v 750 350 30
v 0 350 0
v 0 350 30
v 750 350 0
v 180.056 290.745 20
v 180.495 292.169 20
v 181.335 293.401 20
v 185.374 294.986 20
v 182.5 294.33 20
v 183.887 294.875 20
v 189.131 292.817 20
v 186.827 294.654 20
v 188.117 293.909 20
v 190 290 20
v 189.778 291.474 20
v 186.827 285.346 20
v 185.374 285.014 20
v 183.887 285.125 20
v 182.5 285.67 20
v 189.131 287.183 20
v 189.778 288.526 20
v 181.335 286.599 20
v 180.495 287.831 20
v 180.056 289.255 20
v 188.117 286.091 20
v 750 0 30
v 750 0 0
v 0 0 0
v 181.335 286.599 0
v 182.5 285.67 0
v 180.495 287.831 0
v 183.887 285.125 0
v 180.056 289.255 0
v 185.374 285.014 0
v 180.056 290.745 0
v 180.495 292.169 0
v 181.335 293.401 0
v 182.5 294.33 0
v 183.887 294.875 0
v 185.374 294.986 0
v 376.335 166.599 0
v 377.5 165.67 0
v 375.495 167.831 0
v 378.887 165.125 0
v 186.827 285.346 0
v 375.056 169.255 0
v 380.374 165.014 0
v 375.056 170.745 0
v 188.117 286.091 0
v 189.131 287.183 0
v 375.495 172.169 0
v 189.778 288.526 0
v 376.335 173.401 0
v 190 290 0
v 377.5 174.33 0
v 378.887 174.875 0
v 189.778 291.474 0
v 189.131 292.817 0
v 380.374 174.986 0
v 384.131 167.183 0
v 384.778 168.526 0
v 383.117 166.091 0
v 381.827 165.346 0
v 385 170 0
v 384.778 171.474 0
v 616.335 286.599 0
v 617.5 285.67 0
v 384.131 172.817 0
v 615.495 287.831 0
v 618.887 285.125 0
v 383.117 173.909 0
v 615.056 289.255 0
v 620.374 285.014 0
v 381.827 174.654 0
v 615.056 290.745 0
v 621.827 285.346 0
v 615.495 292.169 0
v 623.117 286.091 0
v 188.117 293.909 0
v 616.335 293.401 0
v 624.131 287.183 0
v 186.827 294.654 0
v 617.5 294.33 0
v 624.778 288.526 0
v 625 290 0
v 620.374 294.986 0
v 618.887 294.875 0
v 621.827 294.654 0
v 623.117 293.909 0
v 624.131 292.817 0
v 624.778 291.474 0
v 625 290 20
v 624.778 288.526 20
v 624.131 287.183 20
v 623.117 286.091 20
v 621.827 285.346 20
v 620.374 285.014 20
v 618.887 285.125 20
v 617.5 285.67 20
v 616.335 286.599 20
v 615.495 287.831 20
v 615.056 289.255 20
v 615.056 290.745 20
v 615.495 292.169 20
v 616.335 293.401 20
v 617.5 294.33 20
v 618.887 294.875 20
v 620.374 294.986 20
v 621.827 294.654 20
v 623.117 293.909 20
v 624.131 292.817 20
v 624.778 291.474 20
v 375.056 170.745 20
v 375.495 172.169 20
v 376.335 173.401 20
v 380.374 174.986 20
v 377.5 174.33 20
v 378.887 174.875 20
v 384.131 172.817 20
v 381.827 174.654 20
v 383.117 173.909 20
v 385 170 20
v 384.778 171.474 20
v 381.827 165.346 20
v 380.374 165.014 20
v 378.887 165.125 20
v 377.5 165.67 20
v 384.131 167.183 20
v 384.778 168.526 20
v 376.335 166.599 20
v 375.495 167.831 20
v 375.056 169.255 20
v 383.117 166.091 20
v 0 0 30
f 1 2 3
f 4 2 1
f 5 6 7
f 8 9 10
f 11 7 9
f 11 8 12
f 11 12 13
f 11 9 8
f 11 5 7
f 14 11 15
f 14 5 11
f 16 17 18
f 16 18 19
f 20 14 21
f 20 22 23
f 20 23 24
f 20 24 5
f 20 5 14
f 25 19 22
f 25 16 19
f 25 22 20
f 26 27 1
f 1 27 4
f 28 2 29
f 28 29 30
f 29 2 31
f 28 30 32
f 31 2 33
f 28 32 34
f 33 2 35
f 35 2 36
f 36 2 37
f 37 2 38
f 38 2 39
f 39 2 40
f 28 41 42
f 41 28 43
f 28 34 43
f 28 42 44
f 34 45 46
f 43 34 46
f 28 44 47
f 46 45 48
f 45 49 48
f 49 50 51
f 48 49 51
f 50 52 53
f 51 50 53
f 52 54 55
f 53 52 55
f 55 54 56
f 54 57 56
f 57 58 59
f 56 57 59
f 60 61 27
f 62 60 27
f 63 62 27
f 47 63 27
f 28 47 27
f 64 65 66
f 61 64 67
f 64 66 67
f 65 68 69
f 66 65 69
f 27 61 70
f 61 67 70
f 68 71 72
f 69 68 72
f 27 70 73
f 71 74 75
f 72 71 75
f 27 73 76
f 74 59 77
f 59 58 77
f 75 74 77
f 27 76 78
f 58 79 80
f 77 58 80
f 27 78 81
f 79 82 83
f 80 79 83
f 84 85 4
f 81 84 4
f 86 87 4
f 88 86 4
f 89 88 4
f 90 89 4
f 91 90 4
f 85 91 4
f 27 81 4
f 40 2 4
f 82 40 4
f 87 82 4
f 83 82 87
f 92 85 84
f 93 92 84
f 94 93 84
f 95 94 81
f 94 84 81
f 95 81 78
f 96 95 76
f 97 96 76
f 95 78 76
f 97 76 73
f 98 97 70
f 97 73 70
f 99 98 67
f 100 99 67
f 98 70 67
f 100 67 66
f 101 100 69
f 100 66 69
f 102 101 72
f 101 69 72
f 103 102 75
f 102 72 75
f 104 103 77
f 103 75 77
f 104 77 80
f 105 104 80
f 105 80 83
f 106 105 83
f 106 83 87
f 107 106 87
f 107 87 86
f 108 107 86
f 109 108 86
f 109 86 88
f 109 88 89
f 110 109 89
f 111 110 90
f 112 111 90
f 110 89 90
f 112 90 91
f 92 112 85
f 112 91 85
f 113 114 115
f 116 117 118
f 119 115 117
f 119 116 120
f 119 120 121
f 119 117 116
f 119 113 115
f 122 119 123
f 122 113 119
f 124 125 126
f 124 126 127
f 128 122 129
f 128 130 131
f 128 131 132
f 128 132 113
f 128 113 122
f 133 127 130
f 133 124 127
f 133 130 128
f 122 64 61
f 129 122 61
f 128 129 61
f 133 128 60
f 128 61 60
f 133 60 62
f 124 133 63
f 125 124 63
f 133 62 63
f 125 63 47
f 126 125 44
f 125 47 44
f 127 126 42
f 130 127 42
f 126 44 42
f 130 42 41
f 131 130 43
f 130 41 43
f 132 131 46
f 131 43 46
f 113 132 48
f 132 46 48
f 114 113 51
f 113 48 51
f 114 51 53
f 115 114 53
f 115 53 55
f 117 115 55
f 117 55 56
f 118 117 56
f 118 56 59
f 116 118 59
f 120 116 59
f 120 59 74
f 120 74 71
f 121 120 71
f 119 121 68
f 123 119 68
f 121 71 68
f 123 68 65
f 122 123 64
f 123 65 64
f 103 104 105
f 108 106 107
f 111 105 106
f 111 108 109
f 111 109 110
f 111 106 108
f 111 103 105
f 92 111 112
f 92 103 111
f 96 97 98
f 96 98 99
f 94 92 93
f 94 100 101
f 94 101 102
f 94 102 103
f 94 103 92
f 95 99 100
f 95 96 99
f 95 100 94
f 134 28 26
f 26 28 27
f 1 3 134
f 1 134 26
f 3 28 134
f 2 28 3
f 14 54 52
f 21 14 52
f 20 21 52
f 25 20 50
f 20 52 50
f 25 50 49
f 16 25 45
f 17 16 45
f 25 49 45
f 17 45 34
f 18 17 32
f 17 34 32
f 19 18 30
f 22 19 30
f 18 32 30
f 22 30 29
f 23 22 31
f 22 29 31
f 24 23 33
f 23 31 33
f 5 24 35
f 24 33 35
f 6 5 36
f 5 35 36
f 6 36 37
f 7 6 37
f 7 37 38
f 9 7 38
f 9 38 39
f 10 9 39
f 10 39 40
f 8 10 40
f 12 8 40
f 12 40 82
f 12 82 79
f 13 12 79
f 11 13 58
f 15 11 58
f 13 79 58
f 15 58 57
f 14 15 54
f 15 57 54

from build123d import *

# Parameters (mm, degrees)
F0_W     = 750
F0_H     = 350
F1_DEPTH = 30
F2_R     = 5
F3_DEPTH = 20
F4_R     = 5
F5_DEPTH = 20
F6_R     = 5
F7_DEPTH = 20


with BuildPart() as f1:
    # F0 (on Top) → F1 (new body)
    with BuildSketch(Plane.XY):
        with Locations((375, 175)):
            Rectangle(F0_W, F0_H)
    extrude(amount=F1_DEPTH)

    # F2 (on face) → F3 (cut)
    with BuildSketch(Plane(origin=(0, 0, 0), x_dir=(1, 0, 0), z_dir=(0, 0, -1))):
        with Locations((380, -170)):
            Circle(F2_R)
    extrude(amount=-F3_DEPTH, mode=Mode.SUBTRACT)

    # F4 (on face) → F5 (cut)
    with BuildSketch(Plane(origin=(0, 0, 0), x_dir=(1, 0, 0), z_dir=(0, 0, -1))):
        with Locations((620, -290)):
            Circle(F4_R)
    extrude(amount=-F5_DEPTH, mode=Mode.SUBTRACT)

    # F6 (on face) → F7 (cut)
    with BuildSketch(Plane(origin=(0, 0, 0), x_dir=(1, 0, 0), z_dir=(0, 0, -1))):
        with Locations((185, -290)):
            Circle(F6_R)
    extrude(amount=-F7_DEPTH, mode=Mode.SUBTRACT)


solid = f1.part
